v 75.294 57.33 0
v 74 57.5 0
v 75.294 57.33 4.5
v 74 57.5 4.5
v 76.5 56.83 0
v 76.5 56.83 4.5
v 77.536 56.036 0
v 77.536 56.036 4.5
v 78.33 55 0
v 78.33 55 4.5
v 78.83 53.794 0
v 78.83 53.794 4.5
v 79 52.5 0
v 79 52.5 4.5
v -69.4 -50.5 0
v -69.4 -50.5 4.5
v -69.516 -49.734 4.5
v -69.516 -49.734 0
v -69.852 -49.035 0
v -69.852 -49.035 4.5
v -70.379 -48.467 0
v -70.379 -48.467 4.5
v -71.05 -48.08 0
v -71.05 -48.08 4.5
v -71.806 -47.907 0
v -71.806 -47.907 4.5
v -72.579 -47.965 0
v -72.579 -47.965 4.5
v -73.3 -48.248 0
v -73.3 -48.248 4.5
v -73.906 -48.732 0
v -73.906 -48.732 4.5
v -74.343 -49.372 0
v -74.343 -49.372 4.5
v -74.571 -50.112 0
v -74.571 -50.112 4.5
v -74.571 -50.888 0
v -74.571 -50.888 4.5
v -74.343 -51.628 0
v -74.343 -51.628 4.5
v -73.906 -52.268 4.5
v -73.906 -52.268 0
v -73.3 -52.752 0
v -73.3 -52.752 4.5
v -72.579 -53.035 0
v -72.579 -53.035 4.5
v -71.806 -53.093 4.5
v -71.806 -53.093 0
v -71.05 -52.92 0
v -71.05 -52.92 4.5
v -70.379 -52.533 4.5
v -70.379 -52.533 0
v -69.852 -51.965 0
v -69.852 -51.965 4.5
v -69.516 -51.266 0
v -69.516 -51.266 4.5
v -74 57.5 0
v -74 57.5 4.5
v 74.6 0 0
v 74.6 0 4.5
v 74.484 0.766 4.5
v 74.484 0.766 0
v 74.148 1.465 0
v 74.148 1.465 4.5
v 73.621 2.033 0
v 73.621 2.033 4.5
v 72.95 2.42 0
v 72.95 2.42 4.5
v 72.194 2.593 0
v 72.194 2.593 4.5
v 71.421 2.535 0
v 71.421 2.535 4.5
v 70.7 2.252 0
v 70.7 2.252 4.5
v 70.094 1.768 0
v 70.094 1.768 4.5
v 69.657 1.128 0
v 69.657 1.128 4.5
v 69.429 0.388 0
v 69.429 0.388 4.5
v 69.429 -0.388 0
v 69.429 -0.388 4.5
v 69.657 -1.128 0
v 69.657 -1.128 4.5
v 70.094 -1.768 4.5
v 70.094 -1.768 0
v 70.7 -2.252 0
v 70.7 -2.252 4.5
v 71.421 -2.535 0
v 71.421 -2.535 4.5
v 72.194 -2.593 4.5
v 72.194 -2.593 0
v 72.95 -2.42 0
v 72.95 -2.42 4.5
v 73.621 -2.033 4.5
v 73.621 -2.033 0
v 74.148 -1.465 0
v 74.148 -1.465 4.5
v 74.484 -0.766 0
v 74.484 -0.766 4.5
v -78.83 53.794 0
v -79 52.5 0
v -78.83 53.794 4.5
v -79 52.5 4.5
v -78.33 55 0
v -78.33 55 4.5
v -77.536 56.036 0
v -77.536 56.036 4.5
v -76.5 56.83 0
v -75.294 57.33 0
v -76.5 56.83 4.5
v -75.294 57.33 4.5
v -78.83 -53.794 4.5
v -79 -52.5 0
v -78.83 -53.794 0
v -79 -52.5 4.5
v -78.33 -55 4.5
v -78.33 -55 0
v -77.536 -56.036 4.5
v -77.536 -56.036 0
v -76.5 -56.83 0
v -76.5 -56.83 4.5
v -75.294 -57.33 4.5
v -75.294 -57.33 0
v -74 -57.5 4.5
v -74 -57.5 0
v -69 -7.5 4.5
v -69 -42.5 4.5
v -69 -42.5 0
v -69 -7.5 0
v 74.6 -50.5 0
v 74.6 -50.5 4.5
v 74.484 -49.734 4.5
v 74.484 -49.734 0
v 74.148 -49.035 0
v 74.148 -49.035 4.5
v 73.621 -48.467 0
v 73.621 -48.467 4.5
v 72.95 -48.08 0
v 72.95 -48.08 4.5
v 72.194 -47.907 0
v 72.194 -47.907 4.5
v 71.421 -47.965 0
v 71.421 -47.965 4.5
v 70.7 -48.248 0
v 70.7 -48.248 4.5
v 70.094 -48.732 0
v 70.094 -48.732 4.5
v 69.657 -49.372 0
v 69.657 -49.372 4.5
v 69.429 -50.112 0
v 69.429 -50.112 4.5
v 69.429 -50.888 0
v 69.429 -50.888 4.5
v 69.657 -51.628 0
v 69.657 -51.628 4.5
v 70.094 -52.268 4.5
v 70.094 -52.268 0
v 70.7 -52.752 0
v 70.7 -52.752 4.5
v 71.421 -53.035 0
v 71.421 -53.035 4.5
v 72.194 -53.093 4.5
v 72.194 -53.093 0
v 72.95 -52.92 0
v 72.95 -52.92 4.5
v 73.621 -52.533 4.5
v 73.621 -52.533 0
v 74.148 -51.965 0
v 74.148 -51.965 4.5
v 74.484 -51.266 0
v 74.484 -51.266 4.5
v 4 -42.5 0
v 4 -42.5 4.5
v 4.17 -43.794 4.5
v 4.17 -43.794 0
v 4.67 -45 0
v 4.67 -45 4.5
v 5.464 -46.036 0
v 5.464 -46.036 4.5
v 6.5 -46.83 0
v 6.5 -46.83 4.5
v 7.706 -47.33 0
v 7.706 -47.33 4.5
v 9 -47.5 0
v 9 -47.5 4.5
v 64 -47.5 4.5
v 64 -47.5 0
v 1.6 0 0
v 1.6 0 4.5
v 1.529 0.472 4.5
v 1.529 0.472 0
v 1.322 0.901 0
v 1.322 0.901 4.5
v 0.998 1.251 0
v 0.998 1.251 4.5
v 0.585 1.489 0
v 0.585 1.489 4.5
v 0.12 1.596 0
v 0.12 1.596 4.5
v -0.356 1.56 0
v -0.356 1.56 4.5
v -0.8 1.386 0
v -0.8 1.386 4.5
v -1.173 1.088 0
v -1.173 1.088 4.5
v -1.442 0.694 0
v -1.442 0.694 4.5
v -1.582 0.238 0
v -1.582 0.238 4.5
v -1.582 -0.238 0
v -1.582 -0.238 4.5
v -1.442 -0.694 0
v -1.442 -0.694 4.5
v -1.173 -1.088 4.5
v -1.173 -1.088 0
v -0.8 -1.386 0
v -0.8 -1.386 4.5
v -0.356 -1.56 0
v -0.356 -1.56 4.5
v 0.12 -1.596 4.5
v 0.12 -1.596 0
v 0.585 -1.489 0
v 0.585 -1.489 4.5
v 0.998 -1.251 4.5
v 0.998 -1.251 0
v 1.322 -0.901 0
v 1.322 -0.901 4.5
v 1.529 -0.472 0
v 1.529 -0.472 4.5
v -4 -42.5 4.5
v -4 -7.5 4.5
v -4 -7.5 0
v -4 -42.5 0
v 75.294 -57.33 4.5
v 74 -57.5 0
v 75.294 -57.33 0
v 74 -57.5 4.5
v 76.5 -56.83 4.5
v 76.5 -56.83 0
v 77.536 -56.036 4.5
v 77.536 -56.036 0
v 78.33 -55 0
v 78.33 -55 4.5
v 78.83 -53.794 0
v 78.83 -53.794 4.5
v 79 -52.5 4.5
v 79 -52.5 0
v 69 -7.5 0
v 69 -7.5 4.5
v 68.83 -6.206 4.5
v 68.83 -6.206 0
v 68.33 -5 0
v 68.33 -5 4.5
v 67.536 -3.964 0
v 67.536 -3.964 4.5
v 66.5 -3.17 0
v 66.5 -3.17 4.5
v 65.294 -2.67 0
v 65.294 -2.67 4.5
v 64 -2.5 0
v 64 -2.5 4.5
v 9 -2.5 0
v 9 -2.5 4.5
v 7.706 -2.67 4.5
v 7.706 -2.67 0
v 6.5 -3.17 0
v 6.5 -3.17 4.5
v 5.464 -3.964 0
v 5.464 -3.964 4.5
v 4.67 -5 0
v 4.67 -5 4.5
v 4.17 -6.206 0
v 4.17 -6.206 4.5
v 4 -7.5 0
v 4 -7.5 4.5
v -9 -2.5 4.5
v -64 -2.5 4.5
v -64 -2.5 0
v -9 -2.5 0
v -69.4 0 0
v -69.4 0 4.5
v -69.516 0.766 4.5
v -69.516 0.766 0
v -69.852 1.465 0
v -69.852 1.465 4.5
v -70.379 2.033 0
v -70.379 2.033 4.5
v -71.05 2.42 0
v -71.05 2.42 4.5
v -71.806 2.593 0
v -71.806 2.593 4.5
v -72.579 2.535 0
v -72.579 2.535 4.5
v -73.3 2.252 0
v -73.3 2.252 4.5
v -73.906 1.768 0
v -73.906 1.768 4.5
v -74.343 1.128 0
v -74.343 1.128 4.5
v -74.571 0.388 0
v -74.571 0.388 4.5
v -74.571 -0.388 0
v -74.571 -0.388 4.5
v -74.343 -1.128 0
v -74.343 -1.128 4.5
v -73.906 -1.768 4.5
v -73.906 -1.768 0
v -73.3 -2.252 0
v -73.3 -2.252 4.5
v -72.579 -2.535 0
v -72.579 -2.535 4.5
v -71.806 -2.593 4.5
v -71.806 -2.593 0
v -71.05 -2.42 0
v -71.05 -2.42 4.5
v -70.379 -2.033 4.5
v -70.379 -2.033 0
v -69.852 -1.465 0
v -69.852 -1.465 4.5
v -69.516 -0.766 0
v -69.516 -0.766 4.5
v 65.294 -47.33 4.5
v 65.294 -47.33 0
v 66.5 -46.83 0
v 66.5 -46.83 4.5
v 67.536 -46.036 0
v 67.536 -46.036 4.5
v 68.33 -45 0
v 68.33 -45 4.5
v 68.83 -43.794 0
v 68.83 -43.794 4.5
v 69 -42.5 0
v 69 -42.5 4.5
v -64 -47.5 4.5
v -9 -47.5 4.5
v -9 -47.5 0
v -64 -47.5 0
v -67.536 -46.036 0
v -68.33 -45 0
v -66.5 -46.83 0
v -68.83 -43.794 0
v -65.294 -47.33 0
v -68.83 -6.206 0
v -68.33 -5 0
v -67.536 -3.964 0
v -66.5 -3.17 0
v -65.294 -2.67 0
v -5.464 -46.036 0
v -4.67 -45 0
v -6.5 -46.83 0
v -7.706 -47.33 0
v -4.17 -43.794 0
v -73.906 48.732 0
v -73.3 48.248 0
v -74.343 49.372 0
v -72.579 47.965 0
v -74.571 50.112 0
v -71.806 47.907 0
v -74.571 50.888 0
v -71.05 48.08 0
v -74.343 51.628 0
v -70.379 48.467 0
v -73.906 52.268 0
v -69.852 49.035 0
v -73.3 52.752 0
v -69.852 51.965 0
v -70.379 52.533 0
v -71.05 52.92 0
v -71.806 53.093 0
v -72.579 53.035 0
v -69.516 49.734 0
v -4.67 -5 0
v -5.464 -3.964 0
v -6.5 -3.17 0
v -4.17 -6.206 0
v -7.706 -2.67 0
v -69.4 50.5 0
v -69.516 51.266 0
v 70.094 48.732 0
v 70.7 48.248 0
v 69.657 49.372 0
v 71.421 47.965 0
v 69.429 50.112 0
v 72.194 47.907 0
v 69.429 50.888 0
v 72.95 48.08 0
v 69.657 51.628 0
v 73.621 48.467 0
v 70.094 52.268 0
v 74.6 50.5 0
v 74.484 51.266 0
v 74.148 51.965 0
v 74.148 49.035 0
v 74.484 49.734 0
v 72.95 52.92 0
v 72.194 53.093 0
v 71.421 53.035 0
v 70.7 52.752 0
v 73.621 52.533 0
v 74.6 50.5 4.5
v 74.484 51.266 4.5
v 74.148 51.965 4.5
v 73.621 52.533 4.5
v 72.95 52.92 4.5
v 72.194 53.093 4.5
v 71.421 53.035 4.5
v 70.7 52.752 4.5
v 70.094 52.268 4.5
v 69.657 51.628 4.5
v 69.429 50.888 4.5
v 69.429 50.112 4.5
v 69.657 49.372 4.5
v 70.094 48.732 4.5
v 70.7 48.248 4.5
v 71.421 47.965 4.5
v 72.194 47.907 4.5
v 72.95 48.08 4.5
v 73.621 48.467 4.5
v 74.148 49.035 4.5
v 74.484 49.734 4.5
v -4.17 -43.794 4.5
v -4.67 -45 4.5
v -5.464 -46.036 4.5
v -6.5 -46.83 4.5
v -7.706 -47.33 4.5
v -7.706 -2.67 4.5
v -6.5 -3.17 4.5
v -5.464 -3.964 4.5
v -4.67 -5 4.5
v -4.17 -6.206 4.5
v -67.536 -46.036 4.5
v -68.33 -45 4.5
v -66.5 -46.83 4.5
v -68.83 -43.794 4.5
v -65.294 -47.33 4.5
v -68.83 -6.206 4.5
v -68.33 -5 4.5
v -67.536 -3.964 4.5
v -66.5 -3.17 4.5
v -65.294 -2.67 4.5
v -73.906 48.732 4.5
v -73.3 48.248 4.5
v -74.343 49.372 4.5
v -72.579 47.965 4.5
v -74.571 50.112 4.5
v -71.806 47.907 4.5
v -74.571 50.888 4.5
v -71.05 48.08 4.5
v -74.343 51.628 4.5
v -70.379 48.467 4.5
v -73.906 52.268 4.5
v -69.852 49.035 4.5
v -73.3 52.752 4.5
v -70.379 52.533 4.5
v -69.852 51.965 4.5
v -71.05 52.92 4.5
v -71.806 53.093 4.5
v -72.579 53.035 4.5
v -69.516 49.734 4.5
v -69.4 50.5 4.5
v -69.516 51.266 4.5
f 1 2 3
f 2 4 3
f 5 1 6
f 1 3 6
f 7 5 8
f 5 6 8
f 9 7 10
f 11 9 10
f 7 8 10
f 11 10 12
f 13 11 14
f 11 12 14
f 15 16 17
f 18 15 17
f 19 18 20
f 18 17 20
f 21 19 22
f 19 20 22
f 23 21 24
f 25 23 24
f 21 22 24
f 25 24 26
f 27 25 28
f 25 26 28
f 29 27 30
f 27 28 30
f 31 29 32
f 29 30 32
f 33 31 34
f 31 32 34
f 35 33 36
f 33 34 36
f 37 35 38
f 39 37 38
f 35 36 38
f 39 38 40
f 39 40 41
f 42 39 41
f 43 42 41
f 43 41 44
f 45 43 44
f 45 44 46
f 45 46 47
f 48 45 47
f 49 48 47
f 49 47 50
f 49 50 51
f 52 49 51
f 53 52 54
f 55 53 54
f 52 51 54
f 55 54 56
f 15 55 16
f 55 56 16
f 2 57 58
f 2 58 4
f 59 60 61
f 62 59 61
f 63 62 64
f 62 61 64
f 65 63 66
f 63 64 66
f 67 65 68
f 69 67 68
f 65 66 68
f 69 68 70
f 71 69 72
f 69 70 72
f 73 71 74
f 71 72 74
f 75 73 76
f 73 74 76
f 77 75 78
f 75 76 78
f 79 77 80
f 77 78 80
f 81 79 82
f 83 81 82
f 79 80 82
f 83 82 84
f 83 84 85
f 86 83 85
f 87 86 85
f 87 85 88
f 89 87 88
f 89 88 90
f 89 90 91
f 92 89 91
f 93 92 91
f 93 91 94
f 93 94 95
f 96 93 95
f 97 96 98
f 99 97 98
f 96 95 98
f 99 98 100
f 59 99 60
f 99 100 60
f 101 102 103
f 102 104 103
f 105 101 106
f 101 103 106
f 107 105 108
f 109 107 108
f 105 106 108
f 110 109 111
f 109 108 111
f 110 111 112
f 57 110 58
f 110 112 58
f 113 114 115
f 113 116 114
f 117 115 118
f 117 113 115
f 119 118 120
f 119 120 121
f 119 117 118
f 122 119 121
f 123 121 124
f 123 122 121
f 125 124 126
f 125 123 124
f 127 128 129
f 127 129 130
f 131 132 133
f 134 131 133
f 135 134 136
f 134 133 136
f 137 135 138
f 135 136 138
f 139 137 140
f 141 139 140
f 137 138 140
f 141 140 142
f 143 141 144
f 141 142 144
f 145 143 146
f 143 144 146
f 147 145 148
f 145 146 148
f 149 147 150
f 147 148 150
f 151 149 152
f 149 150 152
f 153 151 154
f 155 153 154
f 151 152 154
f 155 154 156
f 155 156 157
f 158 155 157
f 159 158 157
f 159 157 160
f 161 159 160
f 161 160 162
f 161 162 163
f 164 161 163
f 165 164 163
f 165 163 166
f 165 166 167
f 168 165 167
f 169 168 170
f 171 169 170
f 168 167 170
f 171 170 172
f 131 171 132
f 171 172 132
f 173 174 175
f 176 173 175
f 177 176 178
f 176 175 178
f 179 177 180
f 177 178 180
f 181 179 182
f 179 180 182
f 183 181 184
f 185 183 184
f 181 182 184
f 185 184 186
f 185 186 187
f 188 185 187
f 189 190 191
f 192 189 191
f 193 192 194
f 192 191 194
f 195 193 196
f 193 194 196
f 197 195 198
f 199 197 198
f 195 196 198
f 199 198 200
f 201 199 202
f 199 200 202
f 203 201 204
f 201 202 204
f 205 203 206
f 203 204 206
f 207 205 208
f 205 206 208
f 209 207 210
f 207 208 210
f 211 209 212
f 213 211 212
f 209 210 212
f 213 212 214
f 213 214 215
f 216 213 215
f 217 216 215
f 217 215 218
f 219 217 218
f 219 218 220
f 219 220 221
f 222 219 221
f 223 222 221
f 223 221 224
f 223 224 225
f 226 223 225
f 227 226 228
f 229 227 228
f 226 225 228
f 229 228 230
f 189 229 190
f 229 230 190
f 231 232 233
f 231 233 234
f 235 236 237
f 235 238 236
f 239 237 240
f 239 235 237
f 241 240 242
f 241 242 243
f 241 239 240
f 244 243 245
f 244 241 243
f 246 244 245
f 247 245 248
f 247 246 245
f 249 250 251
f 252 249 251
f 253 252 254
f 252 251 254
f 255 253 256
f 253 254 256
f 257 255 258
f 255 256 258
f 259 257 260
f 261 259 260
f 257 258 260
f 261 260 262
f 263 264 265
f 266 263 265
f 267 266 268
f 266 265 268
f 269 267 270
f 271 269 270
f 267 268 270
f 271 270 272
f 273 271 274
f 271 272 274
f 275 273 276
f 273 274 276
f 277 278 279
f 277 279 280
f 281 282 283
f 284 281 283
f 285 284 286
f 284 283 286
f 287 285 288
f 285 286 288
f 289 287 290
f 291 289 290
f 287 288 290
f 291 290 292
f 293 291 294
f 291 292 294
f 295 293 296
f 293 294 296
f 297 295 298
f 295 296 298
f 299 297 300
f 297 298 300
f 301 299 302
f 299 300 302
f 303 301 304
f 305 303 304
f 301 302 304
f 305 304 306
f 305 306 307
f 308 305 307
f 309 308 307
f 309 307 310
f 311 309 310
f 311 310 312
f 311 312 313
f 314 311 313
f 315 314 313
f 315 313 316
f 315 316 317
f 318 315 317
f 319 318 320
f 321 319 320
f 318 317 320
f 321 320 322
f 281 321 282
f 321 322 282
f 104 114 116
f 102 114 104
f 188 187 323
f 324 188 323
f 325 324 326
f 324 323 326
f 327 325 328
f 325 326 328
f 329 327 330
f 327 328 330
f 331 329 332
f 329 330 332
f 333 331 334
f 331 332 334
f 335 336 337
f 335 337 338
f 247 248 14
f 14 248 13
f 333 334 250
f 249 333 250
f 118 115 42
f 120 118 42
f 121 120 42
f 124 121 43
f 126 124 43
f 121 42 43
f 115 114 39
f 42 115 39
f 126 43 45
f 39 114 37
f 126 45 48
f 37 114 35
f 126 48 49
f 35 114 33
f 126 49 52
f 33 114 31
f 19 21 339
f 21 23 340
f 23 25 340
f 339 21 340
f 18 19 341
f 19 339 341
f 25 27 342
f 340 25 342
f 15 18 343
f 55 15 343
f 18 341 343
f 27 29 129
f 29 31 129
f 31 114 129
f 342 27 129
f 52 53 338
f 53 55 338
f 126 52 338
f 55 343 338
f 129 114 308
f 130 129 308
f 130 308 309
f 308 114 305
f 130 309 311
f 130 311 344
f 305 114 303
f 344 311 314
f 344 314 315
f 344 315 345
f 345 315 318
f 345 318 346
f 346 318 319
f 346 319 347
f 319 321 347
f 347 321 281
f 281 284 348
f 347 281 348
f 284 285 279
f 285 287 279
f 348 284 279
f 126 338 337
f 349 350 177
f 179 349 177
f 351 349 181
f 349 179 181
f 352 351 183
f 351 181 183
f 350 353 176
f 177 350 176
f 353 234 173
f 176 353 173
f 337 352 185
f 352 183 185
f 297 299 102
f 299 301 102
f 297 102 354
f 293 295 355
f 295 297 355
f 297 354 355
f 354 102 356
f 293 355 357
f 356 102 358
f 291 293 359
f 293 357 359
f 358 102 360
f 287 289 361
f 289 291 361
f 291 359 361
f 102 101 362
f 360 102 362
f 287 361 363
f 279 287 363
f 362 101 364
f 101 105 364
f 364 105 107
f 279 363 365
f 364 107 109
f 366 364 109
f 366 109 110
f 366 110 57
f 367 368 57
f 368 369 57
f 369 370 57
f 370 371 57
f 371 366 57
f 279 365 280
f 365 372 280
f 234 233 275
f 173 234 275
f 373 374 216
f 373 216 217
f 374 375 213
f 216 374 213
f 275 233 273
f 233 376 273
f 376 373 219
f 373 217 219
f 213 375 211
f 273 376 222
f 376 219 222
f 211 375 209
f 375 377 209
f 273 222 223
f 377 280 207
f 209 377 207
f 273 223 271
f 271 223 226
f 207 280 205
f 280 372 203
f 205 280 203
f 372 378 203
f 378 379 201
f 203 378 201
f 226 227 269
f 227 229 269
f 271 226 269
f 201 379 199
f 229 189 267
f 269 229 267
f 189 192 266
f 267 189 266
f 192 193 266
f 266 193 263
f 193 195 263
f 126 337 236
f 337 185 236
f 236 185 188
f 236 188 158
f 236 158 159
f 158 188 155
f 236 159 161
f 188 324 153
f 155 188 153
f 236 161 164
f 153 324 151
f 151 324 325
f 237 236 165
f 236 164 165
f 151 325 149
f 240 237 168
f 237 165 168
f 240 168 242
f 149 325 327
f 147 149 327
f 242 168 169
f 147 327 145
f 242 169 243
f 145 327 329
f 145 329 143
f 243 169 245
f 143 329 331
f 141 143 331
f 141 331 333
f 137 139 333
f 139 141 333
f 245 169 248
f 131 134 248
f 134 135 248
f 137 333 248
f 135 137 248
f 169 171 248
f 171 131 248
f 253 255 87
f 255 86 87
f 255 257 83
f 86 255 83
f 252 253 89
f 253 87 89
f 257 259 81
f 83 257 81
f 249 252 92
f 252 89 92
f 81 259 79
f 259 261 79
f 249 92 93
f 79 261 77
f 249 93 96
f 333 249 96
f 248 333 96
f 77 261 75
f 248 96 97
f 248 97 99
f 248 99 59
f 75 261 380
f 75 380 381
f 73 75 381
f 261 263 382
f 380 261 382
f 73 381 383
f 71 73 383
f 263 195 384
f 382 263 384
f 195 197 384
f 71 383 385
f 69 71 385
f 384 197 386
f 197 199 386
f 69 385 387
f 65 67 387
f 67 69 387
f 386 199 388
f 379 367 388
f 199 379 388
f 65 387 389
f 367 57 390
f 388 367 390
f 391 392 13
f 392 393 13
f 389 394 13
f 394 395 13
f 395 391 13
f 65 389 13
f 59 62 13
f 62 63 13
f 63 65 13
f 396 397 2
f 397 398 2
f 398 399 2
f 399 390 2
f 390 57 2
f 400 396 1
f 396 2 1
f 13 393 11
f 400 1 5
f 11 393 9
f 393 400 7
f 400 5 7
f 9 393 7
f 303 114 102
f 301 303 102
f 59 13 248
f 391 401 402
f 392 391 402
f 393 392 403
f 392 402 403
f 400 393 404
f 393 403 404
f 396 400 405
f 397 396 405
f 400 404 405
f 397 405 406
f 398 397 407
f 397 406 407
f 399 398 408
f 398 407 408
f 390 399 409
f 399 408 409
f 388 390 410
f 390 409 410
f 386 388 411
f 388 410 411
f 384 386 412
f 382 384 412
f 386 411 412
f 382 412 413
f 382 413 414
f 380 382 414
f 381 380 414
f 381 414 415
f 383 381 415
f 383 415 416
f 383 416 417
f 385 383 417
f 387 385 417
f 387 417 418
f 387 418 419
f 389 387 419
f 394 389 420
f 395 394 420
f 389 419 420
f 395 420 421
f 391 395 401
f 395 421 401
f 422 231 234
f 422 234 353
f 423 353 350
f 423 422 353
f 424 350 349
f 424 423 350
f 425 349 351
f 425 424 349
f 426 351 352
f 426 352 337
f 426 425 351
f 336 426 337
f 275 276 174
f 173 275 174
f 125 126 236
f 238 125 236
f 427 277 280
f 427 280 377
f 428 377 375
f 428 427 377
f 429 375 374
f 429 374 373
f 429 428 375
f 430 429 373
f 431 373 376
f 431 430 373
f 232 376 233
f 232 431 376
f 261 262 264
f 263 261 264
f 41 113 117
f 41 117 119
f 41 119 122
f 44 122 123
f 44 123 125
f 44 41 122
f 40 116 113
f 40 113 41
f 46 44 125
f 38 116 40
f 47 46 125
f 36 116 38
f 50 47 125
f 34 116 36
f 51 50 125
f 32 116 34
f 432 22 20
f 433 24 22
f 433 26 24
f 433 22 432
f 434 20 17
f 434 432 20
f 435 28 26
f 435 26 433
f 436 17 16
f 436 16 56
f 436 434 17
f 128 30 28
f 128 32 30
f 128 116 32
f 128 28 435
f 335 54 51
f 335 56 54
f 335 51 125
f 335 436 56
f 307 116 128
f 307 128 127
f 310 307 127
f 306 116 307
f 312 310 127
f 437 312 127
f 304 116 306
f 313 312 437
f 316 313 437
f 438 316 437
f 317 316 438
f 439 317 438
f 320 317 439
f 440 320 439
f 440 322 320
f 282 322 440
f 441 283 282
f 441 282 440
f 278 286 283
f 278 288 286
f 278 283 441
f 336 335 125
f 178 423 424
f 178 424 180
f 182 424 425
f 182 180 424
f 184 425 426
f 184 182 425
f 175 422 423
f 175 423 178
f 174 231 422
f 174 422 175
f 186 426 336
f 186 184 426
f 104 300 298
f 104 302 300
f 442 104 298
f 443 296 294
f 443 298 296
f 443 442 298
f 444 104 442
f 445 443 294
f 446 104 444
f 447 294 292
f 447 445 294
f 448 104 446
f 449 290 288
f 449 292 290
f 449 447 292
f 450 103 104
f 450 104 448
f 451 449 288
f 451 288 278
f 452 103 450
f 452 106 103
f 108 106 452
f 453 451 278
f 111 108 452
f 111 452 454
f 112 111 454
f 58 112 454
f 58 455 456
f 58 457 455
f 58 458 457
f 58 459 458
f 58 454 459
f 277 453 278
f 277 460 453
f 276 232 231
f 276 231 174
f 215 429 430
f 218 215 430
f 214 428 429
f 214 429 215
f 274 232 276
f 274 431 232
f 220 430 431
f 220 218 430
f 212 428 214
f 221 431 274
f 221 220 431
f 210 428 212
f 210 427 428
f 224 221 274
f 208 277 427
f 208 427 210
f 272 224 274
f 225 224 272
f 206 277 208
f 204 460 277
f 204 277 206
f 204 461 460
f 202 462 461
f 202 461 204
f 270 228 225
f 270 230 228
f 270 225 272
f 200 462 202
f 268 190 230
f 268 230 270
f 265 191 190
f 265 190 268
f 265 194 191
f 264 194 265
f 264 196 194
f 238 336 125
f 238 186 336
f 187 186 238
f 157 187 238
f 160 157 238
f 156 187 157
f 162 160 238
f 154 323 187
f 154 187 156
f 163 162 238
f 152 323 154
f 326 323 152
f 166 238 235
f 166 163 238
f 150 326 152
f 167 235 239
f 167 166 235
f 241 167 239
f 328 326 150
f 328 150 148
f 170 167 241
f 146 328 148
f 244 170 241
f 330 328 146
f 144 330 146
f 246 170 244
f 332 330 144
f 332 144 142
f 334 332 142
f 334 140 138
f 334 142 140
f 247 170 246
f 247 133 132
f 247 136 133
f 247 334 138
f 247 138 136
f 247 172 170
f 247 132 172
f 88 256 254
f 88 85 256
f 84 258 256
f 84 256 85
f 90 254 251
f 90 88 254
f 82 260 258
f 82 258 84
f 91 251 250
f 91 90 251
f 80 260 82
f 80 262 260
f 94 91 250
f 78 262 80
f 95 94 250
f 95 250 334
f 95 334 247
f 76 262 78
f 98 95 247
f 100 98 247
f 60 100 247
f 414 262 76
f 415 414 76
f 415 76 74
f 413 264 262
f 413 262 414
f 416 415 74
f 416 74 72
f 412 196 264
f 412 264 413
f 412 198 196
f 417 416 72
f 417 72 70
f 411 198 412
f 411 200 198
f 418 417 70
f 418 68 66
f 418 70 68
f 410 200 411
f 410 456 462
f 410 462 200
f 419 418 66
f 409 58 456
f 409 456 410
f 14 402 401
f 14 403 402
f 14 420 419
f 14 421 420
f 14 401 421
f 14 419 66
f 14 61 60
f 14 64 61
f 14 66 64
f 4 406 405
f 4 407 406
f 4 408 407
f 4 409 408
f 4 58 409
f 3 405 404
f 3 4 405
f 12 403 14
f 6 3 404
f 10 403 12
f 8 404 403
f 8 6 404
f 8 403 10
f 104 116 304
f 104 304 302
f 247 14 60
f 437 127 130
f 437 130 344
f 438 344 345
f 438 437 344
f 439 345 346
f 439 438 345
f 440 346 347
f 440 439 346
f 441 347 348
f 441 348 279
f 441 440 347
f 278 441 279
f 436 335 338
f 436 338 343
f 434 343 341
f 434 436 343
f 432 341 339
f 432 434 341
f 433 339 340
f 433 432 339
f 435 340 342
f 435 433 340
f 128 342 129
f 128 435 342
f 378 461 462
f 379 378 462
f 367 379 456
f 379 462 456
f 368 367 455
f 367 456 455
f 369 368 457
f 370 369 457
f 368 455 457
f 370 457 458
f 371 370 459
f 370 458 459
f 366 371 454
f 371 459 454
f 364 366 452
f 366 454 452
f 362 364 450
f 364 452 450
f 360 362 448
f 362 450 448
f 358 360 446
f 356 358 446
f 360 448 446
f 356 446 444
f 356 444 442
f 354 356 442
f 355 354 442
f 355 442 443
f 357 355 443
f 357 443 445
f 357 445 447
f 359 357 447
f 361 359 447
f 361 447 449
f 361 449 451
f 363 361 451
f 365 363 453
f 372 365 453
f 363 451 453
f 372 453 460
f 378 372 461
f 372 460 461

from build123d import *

# Parameters (mm, degrees)
SKETCH_1_W          = 158
SKETCH_1_H          = 115
EXTRUDE_1_DEPTH     = 4.5
SKETCH_2_R          = 2.6
SKETCH_2_R_2        = 1.6
CUT_EXTRUDE_1_DEPTH = 4.5
FILLET_1_R          = 5


with BuildPart() as part:
    # 草图1 → 凸台-拉伸1 (new body)
    with BuildSketch(Plane.XY):
        Rectangle(SKETCH_1_W, SKETCH_1_H)
    extrude(amount=EXTRUDE_1_DEPTH)

    # 草图2 → 切除-拉伸1 (cut)
    with BuildSketch(Plane.XY.offset(4.5)):
        with Locations((-72, 50.5)):
            Circle(SKETCH_2_R)
        with Locations((72, 50.5)):
            Circle(SKETCH_2_R)
        with Locations((72, 0)):
            Circle(SKETCH_2_R)
        with Locations((72, -50.5)):
            Circle(SKETCH_2_R)
        with Locations((-72, -50.5)):
            Circle(SKETCH_2_R)
        with Locations((-72, 0)):
            Circle(SKETCH_2_R)
        Circle(SKETCH_2_R_2)
        with BuildLine():
            Line((4, -7.5), (4, -42.5))
            ThreePointArc((4, -42.5), (5.464466094, -46.035533906), (9, -47.5))
            Line((9, -47.5), (64, -47.5))
            ThreePointArc((64, -47.5), (67.535533906, -46.035533906), (69, -42.5))
            Line((69, -42.5), (69, -7.5))
            ThreePointArc((69, -7.5), (67.535533906, -3.964466094), (64, -2.5))
            Line((64, -2.5), (9, -2.5))
            ThreePointArc((9, -2.5), (5.464466094, -3.964466094), (4, -7.5))
        make_face()
        with BuildLine():
            Line((-64, -2.5), (-9, -2.5))
            ThreePointArc((-9, -2.5), (-5.464466094, -3.964466094), (-4, -7.5))
            Line((-4, -7.5), (-4, -42.5))
            ThreePointArc((-4, -42.5), (-5.464466094, -46.035533906), (-9, -47.5))
            Line((-9, -47.5), (-64, -47.5))
            ThreePointArc((-64, -47.5), (-67.535533906, -46.035533906), (-69, -42.5))
            Line((-69, -42.5), (-69, -7.5))
            ThreePointArc((-69, -7.5), (-67.535533906, -3.964466094), (-64, -2.5))
        make_face()
    extrude(amount=-CUT_EXTRUDE_1_DEPTH, mode=Mode.SUBTRACT)

    # 圆角1
    fillet_1_edges = [part.edges().sort_by_distance(p)[0] for p in [
        (-79, 57.5, 2.25),
        (79, 57.5, 2.25),
        (79, -57.5, 2.25),
        (-79, -57.5, 2.25),
    ]]
    fillet(fillet_1_edges, radius=FILLET_1_R)


solid = part.part
